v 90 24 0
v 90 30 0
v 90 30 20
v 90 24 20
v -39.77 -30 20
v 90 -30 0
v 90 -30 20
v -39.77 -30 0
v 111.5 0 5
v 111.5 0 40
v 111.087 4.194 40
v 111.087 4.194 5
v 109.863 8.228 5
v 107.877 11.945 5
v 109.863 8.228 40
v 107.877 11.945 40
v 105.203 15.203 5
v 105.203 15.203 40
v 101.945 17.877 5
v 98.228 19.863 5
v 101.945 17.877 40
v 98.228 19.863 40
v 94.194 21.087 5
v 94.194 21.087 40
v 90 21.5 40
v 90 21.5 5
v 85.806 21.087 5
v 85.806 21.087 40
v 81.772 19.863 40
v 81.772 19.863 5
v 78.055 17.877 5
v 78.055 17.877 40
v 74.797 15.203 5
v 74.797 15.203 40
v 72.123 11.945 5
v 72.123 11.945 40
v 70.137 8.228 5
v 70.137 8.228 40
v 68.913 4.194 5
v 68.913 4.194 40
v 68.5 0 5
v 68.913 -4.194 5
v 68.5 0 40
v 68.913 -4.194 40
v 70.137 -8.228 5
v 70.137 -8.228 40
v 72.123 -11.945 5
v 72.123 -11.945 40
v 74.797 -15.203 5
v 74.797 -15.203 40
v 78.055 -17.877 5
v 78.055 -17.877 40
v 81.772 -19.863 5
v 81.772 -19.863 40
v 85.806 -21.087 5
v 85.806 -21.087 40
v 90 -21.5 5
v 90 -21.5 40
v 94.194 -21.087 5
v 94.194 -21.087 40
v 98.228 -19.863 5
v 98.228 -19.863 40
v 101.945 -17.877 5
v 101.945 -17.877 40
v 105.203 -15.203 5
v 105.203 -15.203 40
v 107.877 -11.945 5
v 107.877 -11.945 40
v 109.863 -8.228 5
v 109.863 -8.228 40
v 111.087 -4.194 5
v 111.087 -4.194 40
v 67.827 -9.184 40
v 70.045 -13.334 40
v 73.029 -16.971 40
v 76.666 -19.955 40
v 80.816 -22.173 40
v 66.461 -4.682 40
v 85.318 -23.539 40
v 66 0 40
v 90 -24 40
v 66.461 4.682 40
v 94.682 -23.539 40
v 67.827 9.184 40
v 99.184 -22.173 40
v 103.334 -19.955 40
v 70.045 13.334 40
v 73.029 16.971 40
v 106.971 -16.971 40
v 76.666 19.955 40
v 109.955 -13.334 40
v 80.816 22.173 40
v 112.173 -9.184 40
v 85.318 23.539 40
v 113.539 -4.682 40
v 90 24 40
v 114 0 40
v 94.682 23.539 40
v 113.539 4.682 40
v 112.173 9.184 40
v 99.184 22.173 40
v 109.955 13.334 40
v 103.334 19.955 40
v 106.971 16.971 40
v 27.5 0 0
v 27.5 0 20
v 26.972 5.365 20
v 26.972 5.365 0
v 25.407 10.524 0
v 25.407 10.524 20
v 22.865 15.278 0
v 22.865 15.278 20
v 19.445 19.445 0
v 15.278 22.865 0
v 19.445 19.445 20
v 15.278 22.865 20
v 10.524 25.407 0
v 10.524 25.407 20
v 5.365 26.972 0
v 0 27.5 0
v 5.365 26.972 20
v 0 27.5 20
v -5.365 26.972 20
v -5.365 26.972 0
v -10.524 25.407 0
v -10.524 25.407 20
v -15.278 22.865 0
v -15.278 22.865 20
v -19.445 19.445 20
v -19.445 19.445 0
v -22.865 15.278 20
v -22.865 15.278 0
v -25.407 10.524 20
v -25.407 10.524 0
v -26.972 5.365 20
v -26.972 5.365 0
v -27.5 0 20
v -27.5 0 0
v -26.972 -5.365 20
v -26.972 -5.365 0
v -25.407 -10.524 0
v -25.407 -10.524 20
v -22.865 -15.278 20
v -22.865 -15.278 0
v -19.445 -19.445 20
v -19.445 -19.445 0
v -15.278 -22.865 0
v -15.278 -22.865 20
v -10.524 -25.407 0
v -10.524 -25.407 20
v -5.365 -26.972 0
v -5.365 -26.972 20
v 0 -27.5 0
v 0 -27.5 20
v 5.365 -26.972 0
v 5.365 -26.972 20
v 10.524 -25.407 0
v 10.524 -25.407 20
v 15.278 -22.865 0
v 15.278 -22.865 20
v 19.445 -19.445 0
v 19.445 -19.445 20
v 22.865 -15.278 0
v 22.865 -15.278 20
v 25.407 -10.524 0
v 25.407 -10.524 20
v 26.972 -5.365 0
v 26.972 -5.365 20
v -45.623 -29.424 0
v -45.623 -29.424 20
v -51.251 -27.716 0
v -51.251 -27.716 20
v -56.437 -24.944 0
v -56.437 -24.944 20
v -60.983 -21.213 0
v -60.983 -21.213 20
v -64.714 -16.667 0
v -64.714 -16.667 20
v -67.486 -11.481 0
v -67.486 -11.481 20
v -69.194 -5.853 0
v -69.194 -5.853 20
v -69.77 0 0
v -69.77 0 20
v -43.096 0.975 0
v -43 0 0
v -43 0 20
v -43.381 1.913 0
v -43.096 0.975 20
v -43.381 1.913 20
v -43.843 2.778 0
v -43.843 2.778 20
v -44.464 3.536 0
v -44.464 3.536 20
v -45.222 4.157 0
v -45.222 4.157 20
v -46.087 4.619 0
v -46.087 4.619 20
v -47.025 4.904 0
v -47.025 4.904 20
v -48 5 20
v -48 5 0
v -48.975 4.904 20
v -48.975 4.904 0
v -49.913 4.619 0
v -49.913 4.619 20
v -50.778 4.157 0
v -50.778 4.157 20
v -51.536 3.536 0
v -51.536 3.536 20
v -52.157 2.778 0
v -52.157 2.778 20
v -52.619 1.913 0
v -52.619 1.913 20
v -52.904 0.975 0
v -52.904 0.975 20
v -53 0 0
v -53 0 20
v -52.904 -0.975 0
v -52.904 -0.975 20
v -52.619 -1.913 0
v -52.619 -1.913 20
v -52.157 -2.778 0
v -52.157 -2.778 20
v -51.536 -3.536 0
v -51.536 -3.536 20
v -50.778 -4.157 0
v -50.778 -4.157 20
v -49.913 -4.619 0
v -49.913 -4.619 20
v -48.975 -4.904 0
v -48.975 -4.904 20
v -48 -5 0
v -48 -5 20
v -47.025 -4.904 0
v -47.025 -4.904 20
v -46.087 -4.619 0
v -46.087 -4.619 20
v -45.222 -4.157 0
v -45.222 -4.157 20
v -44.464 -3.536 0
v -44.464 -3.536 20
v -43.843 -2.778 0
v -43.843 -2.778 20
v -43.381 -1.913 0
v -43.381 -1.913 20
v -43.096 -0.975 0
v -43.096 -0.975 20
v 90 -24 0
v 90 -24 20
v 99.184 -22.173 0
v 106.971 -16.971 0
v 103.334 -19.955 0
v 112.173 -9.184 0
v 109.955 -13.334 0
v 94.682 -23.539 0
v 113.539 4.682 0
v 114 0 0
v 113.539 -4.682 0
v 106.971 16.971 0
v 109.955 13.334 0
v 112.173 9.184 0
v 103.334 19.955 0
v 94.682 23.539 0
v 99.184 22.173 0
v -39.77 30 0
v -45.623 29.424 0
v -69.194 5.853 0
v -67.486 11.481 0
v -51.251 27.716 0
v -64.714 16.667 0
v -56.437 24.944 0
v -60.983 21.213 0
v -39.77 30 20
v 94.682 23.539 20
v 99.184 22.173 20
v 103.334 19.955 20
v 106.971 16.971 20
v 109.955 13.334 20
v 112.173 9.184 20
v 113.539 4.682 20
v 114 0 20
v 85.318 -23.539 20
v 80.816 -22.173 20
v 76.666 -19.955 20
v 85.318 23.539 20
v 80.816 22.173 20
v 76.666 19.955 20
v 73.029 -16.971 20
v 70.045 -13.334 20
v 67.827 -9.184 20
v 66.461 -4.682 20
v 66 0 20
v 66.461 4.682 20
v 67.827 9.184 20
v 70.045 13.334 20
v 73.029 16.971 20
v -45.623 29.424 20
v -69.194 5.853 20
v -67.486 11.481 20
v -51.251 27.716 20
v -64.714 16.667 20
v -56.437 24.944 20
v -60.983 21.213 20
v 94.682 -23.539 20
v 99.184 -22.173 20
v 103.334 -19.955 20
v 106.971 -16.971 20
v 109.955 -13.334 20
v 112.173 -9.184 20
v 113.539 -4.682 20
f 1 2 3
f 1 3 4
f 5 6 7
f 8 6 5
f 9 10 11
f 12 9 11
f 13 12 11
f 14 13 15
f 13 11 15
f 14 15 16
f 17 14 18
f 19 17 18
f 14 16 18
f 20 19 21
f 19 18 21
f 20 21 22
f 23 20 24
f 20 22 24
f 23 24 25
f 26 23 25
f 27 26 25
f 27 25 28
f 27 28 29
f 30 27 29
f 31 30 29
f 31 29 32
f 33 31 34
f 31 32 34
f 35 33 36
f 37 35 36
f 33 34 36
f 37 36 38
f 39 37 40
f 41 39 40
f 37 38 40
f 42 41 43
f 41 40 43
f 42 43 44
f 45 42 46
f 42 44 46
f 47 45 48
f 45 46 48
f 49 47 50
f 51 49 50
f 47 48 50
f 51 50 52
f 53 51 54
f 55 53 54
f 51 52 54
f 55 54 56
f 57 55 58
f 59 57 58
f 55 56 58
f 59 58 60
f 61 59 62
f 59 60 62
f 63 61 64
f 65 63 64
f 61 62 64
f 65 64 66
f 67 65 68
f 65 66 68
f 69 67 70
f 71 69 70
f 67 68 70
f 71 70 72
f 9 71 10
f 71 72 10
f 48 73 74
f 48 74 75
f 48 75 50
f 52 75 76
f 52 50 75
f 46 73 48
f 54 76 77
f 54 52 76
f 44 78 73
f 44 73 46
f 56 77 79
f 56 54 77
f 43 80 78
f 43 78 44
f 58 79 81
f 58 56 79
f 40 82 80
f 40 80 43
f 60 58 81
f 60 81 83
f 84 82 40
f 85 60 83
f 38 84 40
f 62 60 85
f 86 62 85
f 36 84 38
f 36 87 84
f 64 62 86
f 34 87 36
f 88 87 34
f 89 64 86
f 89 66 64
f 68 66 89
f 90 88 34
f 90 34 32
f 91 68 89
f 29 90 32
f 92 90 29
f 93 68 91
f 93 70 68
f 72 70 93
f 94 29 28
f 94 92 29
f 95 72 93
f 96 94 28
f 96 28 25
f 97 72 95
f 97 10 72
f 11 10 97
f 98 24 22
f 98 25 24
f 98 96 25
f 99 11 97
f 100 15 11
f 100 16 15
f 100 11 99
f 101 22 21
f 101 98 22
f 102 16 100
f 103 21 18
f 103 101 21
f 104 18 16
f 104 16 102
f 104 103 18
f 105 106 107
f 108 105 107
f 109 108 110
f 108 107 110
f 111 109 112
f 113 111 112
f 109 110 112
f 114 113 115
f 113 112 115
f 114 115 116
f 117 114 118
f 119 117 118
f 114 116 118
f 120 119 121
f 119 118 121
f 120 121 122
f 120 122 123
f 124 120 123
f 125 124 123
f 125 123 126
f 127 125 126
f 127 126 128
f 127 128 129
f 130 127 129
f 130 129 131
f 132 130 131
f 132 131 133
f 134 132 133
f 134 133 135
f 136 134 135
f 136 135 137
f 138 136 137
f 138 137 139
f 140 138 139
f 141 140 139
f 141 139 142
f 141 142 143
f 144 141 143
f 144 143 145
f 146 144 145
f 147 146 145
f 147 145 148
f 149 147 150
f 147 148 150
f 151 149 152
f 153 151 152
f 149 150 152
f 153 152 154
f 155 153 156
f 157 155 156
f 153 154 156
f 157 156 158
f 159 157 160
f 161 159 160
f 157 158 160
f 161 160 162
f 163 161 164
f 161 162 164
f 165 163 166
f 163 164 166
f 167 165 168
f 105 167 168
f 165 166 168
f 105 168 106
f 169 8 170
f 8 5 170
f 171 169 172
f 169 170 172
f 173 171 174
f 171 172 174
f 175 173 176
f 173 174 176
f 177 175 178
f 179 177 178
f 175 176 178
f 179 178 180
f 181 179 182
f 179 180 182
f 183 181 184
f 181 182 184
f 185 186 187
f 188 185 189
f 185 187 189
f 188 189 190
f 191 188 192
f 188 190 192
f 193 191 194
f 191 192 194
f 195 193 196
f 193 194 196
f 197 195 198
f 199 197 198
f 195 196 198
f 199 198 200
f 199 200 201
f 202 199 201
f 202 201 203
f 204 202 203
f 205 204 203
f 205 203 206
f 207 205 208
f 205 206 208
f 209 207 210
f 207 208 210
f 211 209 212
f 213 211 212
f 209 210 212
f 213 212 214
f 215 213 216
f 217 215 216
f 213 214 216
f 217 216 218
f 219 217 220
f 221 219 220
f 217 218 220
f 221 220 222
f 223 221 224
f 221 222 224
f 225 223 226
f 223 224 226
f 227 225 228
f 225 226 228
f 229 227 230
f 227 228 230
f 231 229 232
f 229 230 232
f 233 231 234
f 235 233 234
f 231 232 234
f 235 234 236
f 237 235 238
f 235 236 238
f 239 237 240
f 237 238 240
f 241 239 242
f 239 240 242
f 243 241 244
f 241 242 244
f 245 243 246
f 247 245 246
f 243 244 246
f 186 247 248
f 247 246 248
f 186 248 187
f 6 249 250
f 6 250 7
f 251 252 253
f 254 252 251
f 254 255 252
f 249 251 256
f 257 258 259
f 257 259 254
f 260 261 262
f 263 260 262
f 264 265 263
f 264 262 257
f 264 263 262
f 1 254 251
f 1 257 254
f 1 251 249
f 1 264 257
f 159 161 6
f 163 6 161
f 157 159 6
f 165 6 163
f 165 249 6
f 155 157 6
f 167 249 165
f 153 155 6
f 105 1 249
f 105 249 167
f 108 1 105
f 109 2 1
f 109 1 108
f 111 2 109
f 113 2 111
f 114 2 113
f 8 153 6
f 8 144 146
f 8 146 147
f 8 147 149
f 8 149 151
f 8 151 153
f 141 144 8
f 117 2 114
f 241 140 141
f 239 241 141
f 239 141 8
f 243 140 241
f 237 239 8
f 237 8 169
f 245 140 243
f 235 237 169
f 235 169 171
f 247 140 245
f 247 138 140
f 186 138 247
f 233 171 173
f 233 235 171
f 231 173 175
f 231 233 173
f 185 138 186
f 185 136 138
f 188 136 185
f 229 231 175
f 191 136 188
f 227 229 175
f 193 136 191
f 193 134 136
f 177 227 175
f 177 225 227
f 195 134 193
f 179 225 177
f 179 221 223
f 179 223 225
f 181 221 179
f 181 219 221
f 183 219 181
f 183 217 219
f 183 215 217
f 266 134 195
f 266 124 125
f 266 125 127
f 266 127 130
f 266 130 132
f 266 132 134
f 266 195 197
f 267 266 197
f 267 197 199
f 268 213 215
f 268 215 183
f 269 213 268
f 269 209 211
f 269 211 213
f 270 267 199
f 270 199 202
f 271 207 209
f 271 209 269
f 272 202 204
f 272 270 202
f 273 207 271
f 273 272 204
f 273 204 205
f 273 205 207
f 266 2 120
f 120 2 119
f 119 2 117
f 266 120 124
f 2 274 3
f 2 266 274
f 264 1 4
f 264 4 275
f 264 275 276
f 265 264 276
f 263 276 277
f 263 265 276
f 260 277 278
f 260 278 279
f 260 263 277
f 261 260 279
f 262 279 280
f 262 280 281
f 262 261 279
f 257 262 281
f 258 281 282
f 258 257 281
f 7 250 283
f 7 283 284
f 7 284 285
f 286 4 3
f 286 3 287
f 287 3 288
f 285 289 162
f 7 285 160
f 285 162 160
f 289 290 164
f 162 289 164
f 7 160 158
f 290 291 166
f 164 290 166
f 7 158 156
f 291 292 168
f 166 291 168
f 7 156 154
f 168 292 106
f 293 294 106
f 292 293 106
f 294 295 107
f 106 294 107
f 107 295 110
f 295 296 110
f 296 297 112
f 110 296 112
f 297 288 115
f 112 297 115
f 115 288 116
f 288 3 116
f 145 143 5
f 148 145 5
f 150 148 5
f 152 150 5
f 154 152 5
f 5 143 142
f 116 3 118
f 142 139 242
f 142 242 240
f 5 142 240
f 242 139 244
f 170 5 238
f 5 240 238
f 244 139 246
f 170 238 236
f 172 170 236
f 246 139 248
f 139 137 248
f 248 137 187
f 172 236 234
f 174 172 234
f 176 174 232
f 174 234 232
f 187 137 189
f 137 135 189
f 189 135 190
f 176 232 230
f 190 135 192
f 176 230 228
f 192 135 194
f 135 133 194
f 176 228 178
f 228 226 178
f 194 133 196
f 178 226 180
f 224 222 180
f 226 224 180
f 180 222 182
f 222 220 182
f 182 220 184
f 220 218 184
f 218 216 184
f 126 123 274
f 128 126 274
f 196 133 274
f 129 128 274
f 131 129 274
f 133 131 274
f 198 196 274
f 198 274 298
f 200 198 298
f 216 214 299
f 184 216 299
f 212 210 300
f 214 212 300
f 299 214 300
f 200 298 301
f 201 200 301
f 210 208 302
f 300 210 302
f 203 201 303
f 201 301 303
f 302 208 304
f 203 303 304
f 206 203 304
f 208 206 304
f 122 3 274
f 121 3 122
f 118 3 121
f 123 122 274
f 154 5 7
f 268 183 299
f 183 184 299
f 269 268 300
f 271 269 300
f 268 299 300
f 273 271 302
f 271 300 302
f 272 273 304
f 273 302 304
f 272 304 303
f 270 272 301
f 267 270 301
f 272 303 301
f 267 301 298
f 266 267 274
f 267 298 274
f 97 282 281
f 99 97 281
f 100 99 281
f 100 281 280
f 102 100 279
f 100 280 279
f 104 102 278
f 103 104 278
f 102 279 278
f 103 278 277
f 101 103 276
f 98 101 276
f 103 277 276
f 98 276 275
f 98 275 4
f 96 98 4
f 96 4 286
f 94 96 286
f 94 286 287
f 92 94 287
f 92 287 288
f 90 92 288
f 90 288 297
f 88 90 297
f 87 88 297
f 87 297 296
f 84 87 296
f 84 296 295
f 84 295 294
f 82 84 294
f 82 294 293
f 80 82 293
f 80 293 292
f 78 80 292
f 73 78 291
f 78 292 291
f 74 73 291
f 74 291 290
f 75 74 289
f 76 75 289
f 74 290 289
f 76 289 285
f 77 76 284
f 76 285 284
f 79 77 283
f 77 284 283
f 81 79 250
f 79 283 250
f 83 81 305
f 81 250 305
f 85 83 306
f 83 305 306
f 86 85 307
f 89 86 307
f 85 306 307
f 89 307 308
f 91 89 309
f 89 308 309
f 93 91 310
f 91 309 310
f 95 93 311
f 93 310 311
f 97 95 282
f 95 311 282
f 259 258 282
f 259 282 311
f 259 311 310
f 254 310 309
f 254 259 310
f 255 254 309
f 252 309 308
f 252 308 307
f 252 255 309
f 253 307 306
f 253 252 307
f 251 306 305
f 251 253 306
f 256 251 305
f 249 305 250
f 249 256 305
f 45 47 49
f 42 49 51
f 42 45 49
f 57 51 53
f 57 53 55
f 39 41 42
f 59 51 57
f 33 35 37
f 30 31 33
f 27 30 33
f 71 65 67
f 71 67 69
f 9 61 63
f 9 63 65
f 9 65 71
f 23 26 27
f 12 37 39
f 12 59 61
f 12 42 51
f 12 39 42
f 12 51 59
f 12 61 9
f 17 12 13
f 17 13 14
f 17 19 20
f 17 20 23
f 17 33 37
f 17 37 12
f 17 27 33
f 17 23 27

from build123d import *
from build123d.topology import SkipClean

# Parameters (mm, degrees)
SKETCH1_R           = 30
BOSS_EXTRUDE1_DEPTH = 20
SKETCH2_R           = 27.5
CUT_EXTRUDE1_DEPTH  = 47.904157598
BOSS_EXTRUDE2_START = -20
BOSS_EXTRUDE2_DEPTH = 20
SKETCH6_R           = 21.5
CUT_EXTRUDE2_DEPTH  = 35
SKETCH11_R          = 24
BOSS_EXTRUDE3_DEPTH = 20
BOSS_EXTRUDE4_START = -40
SKETCH12_R          = 24
BOSS_EXTRUDE4_DEPTH = 40
SKETCH13_R          = 21.5
CUT_EXTRUDE6_DEPTH  = 35
BOSS_EXTRUDE6_START = -20
BOSS_EXTRUDE6_DEPTH = 20
SKETCH15_R          = 5
CUT_EXTRUDE8_DEPTH  = 20
FILLET1_R           = 30
FILLET2_R           = 30


with BuildPart() as part:
    # Sketch1 → Boss-Extrude1 (new body)
    with BuildSketch(Plane.XY):
        Circle(SKETCH1_R)
    extrude(amount=BOSS_EXTRUDE1_DEPTH)

    # Sketch2 → Cut-Extrude1 (cut, through all)
    with BuildSketch(Plane.XY.offset(20)):
        Circle(SKETCH2_R)
    extrude(amount=-CUT_EXTRUDE1_DEPTH, mode=Mode.SUBTRACT)

    # Sketch4 → Boss-Extrude2 (add)
    with BuildSketch(Plane.XY.offset(20).offset(BOSS_EXTRUDE2_START)):
        with BuildLine():
            Line((0, 30), (90, 30))
            Line((90, 30), (90, 24))
            ThreePointArc((90, 24), (114, 0), (90, -24))
            Line((90, -24), (90, -30))
            Line((90, -30), (0, -30))
            ThreePointArc((0, -30), (30, 0), (0, 30))
        make_face()
    extrude(amount=BOSS_EXTRUDE2_DEPTH)

    # Sketch6 → Cut-Extrude2 (cut)
    with BuildSketch(Plane.XY.offset(20)):
        with Locations((90, 0)):
            Circle(SKETCH6_R)
    extrude(amount=-CUT_EXTRUDE2_DEPTH, mode=Mode.SUBTRACT)

    # Sketch11 → Boss-Extrude3 (add)
    with SkipClean():  # the faces are left unmerged after this step: merging them gives an invalid solid
        with BuildSketch(Plane.XY.offset(20)):
            with Locations((90, 0)):
                Circle(SKETCH11_R)
        extrude(amount=BOSS_EXTRUDE3_DEPTH)
    add(part.part.scale(1), mode=Mode.REPLACE)  # the faces are merged on a copy

    # Sketch12 → Boss-Extrude4 (add)
    with SkipClean():  # the faces are left unmerged after this step: merging them gives an invalid solid
        with BuildSketch(Plane.XY.offset(40).offset(BOSS_EXTRUDE4_START)):
            with Locations((90, 0)):
                Circle(SKETCH12_R)
        extrude(amount=BOSS_EXTRUDE4_DEPTH)

    # Sketch13 → Cut-Extrude6 (cut)
    with SkipClean():  # the faces are left unmerged after this step: merging them gives an invalid solid
        with BuildSketch(Plane.XY.offset(40)):
            with Locations((90, 0)):
                Circle(SKETCH13_R)
        extrude(amount=-CUT_EXTRUDE6_DEPTH, mode=Mode.SUBTRACT)

    # Sketch14 → Boss-Extrude6 (add)
    with BuildSketch(Plane.XY.offset(20).offset(BOSS_EXTRUDE6_START)):
        with BuildLine():
            ThreePointArc((0, 30), (-30, 0), (0, -30))
            Line((0, -30), (-69.770044623, -30))
            Line((-69.770044623, -30), (-69.770044623, 30))
            Line((-69.770044623, 30), (0, 30))
        make_face()
    extrude(amount=BOSS_EXTRUDE6_DEPTH)

    # Sketch15 → Cut-Extrude8 (cut)
    with BuildSketch(Plane.XY.offset(20)):
        with Locations((-48, 0)):
            Circle(SKETCH15_R)
    extrude(amount=-CUT_EXTRUDE8_DEPTH, mode=Mode.SUBTRACT)

    # Fillet1
    fillet1_edges = [part.edges().sort_by_distance(p)[0] for p in [
        (-69.770044623, -30, 10),
    ]]
    fillet(fillet1_edges, radius=FILLET1_R)

    # Fillet2
    fillet2_edges = [part.edges().sort_by_distance(p)[0] for p in [
        (-69.770044623, 30, 10),
    ]]
    fillet(fillet2_edges, radius=FILLET2_R - 0.0001)  # a hair under: the kernel refuses the full size


solid = part.part
